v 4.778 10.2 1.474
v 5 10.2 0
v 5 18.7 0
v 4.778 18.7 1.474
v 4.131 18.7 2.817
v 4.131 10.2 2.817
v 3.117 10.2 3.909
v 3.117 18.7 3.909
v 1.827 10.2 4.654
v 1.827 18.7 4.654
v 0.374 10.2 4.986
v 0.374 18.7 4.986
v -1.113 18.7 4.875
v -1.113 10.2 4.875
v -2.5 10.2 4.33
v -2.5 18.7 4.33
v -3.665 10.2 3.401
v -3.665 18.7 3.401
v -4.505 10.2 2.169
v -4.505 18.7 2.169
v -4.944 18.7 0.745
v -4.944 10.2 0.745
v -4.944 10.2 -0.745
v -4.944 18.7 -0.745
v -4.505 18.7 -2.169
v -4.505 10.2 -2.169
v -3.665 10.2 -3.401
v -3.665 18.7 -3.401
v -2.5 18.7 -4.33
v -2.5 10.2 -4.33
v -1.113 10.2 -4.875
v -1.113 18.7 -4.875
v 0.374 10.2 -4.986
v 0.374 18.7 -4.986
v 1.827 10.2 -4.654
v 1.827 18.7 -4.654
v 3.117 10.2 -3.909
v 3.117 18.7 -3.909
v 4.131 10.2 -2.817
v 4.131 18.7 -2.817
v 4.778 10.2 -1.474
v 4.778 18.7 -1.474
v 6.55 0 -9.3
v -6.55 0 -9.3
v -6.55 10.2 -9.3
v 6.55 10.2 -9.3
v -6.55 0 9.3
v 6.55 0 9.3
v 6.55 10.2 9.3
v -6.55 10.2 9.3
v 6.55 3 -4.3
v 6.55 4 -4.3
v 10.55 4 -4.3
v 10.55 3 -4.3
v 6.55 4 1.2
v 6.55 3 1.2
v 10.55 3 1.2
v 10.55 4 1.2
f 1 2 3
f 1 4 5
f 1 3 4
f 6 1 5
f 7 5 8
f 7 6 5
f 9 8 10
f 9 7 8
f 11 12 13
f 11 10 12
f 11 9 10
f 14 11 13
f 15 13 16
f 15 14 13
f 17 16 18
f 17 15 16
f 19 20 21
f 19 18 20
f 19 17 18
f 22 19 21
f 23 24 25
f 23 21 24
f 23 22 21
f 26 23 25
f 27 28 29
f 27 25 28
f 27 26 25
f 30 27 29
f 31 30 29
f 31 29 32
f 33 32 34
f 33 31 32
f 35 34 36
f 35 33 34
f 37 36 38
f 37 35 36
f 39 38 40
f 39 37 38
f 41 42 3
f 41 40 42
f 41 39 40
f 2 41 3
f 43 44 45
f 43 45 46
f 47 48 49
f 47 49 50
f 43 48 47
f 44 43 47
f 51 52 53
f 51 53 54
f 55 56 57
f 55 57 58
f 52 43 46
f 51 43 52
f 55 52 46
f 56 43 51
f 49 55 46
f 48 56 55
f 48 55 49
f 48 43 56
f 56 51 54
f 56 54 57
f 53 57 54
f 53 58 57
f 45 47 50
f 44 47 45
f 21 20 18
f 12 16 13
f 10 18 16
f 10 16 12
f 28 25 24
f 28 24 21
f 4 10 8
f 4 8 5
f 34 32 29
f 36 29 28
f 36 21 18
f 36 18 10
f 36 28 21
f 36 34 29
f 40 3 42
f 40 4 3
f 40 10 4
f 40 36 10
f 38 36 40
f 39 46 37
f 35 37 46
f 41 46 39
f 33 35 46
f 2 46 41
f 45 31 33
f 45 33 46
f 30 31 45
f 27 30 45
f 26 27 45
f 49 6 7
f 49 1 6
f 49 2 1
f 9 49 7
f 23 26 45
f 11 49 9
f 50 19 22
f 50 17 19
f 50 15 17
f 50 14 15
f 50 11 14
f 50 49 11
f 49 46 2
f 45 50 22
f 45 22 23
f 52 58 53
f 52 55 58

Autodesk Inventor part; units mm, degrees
ref_plane "YZ Plane" through (0, 0, 0) normal (1, 0, 0) x (0, 1, 0)
ref_plane "XZ Plane" through (0, 0, 0) normal (0, 1, 0) x (-1, 0, 0)
ref_plane "XY Plane" through (0, 0, 0) normal (0, 0, 1) x (1, 0, 0)
sketch "Sketch1" plane through (0, 0, 0) normal (0, 1, 0) x (-1, 0, 0)
  line L0 (-6.55, 9.3) -> (6.55, 9.3)
  line L1 (6.55, 9.3) -> (6.55, -9.3)
  line L2 (6.55, -9.3) -> (-6.55, -9.3)
  line L3 (-6.55, -9.3) -> (-6.55, 9.3)
  line L4 (0, 0) -> (1, 0)
  line L5 (0, 0) -> (0, -1)
  dimension "d0" = 18.6
  dimension "d1" = 13.1
  dimension "d2" = 1
  dimension "d3" = 1
extrude "Extrusion1" add sketch "Sketch1" along normal blind 10.2
sketch "Sketch2" plane through (0, 10.2, 0) normal (0, 1, 0) x (1, 0, 0)
  circle A0 centre (0, 0) radius 5
  dimension "d6" = 10
extrude "Extrusion2" add sketch "Sketch2" along normal blind 8.5
sketch "Sketch3" plane through (6.55, 0, 9.3) normal (1, 0, 0) x (0, 0, -1)
  point P0 (9.3, 0)
sketch "Sketch4" plane through (6.55, 0, 9.3) normal (1, 0, 0) x (0, 0, -1)
  circle A0 centre (7.5, 3.5) radius 2.5
  line L0 (0, 0) -> (0, 10.2) projected
  line L1 (18.6, 0) -> (0, 0) projected
  point P0 (9.3, 0)
  dimension "d9" = 5
  dimension "d10" = 7.5
  dimension "d11" = 3.5
extrude "Extrusion3" [suppressed]
sketch "Sketch5" plane through (11.55, 3.5, 1.8) normal (1, 0, 0) x (0, 0, -1)
  circle A0 centre (0, 0) radius 15
  point P0 (1.8, -3.5)
  dimension "d14" = 30
extrude "Extrusion4" [suppressed]
sketch "Náčrt6" plane through (6.55, 0, 9.3) normal (1, 0, 0) x (0, 0, -1)
  line L0 (18.6, 0) -> (0, 0) projected
  line L1 (18.6, 0) -> (18.6, 10.2) projected
  line L2 (0, 10.2) -> (18.6, 10.2) projected
  line L3 (0, 0) -> (0, 10.2) projected
  line L4 (13.6, 3) -> (8.1, 3)
  line L5 (8.1, 3) -> (8.1, 4)
  line L6 (8.1, 4) -> (13.6, 4)
  line L7 (13.6, 4) -> (13.6, 3)
  point P0 (9.3, 0)
  dimension "d17" = 10.2
  dimension "d18" = 18.6
  dimension "d19" = 3
  dimension "d20" = 1
  dimension "d21" = 5.5
  dimension "d22" = 5
extrude "Vysunutí5" add sketch "Náčrt6" along normal blind 4 contours L4 L5 L6 L7
properties part number "Camera"
